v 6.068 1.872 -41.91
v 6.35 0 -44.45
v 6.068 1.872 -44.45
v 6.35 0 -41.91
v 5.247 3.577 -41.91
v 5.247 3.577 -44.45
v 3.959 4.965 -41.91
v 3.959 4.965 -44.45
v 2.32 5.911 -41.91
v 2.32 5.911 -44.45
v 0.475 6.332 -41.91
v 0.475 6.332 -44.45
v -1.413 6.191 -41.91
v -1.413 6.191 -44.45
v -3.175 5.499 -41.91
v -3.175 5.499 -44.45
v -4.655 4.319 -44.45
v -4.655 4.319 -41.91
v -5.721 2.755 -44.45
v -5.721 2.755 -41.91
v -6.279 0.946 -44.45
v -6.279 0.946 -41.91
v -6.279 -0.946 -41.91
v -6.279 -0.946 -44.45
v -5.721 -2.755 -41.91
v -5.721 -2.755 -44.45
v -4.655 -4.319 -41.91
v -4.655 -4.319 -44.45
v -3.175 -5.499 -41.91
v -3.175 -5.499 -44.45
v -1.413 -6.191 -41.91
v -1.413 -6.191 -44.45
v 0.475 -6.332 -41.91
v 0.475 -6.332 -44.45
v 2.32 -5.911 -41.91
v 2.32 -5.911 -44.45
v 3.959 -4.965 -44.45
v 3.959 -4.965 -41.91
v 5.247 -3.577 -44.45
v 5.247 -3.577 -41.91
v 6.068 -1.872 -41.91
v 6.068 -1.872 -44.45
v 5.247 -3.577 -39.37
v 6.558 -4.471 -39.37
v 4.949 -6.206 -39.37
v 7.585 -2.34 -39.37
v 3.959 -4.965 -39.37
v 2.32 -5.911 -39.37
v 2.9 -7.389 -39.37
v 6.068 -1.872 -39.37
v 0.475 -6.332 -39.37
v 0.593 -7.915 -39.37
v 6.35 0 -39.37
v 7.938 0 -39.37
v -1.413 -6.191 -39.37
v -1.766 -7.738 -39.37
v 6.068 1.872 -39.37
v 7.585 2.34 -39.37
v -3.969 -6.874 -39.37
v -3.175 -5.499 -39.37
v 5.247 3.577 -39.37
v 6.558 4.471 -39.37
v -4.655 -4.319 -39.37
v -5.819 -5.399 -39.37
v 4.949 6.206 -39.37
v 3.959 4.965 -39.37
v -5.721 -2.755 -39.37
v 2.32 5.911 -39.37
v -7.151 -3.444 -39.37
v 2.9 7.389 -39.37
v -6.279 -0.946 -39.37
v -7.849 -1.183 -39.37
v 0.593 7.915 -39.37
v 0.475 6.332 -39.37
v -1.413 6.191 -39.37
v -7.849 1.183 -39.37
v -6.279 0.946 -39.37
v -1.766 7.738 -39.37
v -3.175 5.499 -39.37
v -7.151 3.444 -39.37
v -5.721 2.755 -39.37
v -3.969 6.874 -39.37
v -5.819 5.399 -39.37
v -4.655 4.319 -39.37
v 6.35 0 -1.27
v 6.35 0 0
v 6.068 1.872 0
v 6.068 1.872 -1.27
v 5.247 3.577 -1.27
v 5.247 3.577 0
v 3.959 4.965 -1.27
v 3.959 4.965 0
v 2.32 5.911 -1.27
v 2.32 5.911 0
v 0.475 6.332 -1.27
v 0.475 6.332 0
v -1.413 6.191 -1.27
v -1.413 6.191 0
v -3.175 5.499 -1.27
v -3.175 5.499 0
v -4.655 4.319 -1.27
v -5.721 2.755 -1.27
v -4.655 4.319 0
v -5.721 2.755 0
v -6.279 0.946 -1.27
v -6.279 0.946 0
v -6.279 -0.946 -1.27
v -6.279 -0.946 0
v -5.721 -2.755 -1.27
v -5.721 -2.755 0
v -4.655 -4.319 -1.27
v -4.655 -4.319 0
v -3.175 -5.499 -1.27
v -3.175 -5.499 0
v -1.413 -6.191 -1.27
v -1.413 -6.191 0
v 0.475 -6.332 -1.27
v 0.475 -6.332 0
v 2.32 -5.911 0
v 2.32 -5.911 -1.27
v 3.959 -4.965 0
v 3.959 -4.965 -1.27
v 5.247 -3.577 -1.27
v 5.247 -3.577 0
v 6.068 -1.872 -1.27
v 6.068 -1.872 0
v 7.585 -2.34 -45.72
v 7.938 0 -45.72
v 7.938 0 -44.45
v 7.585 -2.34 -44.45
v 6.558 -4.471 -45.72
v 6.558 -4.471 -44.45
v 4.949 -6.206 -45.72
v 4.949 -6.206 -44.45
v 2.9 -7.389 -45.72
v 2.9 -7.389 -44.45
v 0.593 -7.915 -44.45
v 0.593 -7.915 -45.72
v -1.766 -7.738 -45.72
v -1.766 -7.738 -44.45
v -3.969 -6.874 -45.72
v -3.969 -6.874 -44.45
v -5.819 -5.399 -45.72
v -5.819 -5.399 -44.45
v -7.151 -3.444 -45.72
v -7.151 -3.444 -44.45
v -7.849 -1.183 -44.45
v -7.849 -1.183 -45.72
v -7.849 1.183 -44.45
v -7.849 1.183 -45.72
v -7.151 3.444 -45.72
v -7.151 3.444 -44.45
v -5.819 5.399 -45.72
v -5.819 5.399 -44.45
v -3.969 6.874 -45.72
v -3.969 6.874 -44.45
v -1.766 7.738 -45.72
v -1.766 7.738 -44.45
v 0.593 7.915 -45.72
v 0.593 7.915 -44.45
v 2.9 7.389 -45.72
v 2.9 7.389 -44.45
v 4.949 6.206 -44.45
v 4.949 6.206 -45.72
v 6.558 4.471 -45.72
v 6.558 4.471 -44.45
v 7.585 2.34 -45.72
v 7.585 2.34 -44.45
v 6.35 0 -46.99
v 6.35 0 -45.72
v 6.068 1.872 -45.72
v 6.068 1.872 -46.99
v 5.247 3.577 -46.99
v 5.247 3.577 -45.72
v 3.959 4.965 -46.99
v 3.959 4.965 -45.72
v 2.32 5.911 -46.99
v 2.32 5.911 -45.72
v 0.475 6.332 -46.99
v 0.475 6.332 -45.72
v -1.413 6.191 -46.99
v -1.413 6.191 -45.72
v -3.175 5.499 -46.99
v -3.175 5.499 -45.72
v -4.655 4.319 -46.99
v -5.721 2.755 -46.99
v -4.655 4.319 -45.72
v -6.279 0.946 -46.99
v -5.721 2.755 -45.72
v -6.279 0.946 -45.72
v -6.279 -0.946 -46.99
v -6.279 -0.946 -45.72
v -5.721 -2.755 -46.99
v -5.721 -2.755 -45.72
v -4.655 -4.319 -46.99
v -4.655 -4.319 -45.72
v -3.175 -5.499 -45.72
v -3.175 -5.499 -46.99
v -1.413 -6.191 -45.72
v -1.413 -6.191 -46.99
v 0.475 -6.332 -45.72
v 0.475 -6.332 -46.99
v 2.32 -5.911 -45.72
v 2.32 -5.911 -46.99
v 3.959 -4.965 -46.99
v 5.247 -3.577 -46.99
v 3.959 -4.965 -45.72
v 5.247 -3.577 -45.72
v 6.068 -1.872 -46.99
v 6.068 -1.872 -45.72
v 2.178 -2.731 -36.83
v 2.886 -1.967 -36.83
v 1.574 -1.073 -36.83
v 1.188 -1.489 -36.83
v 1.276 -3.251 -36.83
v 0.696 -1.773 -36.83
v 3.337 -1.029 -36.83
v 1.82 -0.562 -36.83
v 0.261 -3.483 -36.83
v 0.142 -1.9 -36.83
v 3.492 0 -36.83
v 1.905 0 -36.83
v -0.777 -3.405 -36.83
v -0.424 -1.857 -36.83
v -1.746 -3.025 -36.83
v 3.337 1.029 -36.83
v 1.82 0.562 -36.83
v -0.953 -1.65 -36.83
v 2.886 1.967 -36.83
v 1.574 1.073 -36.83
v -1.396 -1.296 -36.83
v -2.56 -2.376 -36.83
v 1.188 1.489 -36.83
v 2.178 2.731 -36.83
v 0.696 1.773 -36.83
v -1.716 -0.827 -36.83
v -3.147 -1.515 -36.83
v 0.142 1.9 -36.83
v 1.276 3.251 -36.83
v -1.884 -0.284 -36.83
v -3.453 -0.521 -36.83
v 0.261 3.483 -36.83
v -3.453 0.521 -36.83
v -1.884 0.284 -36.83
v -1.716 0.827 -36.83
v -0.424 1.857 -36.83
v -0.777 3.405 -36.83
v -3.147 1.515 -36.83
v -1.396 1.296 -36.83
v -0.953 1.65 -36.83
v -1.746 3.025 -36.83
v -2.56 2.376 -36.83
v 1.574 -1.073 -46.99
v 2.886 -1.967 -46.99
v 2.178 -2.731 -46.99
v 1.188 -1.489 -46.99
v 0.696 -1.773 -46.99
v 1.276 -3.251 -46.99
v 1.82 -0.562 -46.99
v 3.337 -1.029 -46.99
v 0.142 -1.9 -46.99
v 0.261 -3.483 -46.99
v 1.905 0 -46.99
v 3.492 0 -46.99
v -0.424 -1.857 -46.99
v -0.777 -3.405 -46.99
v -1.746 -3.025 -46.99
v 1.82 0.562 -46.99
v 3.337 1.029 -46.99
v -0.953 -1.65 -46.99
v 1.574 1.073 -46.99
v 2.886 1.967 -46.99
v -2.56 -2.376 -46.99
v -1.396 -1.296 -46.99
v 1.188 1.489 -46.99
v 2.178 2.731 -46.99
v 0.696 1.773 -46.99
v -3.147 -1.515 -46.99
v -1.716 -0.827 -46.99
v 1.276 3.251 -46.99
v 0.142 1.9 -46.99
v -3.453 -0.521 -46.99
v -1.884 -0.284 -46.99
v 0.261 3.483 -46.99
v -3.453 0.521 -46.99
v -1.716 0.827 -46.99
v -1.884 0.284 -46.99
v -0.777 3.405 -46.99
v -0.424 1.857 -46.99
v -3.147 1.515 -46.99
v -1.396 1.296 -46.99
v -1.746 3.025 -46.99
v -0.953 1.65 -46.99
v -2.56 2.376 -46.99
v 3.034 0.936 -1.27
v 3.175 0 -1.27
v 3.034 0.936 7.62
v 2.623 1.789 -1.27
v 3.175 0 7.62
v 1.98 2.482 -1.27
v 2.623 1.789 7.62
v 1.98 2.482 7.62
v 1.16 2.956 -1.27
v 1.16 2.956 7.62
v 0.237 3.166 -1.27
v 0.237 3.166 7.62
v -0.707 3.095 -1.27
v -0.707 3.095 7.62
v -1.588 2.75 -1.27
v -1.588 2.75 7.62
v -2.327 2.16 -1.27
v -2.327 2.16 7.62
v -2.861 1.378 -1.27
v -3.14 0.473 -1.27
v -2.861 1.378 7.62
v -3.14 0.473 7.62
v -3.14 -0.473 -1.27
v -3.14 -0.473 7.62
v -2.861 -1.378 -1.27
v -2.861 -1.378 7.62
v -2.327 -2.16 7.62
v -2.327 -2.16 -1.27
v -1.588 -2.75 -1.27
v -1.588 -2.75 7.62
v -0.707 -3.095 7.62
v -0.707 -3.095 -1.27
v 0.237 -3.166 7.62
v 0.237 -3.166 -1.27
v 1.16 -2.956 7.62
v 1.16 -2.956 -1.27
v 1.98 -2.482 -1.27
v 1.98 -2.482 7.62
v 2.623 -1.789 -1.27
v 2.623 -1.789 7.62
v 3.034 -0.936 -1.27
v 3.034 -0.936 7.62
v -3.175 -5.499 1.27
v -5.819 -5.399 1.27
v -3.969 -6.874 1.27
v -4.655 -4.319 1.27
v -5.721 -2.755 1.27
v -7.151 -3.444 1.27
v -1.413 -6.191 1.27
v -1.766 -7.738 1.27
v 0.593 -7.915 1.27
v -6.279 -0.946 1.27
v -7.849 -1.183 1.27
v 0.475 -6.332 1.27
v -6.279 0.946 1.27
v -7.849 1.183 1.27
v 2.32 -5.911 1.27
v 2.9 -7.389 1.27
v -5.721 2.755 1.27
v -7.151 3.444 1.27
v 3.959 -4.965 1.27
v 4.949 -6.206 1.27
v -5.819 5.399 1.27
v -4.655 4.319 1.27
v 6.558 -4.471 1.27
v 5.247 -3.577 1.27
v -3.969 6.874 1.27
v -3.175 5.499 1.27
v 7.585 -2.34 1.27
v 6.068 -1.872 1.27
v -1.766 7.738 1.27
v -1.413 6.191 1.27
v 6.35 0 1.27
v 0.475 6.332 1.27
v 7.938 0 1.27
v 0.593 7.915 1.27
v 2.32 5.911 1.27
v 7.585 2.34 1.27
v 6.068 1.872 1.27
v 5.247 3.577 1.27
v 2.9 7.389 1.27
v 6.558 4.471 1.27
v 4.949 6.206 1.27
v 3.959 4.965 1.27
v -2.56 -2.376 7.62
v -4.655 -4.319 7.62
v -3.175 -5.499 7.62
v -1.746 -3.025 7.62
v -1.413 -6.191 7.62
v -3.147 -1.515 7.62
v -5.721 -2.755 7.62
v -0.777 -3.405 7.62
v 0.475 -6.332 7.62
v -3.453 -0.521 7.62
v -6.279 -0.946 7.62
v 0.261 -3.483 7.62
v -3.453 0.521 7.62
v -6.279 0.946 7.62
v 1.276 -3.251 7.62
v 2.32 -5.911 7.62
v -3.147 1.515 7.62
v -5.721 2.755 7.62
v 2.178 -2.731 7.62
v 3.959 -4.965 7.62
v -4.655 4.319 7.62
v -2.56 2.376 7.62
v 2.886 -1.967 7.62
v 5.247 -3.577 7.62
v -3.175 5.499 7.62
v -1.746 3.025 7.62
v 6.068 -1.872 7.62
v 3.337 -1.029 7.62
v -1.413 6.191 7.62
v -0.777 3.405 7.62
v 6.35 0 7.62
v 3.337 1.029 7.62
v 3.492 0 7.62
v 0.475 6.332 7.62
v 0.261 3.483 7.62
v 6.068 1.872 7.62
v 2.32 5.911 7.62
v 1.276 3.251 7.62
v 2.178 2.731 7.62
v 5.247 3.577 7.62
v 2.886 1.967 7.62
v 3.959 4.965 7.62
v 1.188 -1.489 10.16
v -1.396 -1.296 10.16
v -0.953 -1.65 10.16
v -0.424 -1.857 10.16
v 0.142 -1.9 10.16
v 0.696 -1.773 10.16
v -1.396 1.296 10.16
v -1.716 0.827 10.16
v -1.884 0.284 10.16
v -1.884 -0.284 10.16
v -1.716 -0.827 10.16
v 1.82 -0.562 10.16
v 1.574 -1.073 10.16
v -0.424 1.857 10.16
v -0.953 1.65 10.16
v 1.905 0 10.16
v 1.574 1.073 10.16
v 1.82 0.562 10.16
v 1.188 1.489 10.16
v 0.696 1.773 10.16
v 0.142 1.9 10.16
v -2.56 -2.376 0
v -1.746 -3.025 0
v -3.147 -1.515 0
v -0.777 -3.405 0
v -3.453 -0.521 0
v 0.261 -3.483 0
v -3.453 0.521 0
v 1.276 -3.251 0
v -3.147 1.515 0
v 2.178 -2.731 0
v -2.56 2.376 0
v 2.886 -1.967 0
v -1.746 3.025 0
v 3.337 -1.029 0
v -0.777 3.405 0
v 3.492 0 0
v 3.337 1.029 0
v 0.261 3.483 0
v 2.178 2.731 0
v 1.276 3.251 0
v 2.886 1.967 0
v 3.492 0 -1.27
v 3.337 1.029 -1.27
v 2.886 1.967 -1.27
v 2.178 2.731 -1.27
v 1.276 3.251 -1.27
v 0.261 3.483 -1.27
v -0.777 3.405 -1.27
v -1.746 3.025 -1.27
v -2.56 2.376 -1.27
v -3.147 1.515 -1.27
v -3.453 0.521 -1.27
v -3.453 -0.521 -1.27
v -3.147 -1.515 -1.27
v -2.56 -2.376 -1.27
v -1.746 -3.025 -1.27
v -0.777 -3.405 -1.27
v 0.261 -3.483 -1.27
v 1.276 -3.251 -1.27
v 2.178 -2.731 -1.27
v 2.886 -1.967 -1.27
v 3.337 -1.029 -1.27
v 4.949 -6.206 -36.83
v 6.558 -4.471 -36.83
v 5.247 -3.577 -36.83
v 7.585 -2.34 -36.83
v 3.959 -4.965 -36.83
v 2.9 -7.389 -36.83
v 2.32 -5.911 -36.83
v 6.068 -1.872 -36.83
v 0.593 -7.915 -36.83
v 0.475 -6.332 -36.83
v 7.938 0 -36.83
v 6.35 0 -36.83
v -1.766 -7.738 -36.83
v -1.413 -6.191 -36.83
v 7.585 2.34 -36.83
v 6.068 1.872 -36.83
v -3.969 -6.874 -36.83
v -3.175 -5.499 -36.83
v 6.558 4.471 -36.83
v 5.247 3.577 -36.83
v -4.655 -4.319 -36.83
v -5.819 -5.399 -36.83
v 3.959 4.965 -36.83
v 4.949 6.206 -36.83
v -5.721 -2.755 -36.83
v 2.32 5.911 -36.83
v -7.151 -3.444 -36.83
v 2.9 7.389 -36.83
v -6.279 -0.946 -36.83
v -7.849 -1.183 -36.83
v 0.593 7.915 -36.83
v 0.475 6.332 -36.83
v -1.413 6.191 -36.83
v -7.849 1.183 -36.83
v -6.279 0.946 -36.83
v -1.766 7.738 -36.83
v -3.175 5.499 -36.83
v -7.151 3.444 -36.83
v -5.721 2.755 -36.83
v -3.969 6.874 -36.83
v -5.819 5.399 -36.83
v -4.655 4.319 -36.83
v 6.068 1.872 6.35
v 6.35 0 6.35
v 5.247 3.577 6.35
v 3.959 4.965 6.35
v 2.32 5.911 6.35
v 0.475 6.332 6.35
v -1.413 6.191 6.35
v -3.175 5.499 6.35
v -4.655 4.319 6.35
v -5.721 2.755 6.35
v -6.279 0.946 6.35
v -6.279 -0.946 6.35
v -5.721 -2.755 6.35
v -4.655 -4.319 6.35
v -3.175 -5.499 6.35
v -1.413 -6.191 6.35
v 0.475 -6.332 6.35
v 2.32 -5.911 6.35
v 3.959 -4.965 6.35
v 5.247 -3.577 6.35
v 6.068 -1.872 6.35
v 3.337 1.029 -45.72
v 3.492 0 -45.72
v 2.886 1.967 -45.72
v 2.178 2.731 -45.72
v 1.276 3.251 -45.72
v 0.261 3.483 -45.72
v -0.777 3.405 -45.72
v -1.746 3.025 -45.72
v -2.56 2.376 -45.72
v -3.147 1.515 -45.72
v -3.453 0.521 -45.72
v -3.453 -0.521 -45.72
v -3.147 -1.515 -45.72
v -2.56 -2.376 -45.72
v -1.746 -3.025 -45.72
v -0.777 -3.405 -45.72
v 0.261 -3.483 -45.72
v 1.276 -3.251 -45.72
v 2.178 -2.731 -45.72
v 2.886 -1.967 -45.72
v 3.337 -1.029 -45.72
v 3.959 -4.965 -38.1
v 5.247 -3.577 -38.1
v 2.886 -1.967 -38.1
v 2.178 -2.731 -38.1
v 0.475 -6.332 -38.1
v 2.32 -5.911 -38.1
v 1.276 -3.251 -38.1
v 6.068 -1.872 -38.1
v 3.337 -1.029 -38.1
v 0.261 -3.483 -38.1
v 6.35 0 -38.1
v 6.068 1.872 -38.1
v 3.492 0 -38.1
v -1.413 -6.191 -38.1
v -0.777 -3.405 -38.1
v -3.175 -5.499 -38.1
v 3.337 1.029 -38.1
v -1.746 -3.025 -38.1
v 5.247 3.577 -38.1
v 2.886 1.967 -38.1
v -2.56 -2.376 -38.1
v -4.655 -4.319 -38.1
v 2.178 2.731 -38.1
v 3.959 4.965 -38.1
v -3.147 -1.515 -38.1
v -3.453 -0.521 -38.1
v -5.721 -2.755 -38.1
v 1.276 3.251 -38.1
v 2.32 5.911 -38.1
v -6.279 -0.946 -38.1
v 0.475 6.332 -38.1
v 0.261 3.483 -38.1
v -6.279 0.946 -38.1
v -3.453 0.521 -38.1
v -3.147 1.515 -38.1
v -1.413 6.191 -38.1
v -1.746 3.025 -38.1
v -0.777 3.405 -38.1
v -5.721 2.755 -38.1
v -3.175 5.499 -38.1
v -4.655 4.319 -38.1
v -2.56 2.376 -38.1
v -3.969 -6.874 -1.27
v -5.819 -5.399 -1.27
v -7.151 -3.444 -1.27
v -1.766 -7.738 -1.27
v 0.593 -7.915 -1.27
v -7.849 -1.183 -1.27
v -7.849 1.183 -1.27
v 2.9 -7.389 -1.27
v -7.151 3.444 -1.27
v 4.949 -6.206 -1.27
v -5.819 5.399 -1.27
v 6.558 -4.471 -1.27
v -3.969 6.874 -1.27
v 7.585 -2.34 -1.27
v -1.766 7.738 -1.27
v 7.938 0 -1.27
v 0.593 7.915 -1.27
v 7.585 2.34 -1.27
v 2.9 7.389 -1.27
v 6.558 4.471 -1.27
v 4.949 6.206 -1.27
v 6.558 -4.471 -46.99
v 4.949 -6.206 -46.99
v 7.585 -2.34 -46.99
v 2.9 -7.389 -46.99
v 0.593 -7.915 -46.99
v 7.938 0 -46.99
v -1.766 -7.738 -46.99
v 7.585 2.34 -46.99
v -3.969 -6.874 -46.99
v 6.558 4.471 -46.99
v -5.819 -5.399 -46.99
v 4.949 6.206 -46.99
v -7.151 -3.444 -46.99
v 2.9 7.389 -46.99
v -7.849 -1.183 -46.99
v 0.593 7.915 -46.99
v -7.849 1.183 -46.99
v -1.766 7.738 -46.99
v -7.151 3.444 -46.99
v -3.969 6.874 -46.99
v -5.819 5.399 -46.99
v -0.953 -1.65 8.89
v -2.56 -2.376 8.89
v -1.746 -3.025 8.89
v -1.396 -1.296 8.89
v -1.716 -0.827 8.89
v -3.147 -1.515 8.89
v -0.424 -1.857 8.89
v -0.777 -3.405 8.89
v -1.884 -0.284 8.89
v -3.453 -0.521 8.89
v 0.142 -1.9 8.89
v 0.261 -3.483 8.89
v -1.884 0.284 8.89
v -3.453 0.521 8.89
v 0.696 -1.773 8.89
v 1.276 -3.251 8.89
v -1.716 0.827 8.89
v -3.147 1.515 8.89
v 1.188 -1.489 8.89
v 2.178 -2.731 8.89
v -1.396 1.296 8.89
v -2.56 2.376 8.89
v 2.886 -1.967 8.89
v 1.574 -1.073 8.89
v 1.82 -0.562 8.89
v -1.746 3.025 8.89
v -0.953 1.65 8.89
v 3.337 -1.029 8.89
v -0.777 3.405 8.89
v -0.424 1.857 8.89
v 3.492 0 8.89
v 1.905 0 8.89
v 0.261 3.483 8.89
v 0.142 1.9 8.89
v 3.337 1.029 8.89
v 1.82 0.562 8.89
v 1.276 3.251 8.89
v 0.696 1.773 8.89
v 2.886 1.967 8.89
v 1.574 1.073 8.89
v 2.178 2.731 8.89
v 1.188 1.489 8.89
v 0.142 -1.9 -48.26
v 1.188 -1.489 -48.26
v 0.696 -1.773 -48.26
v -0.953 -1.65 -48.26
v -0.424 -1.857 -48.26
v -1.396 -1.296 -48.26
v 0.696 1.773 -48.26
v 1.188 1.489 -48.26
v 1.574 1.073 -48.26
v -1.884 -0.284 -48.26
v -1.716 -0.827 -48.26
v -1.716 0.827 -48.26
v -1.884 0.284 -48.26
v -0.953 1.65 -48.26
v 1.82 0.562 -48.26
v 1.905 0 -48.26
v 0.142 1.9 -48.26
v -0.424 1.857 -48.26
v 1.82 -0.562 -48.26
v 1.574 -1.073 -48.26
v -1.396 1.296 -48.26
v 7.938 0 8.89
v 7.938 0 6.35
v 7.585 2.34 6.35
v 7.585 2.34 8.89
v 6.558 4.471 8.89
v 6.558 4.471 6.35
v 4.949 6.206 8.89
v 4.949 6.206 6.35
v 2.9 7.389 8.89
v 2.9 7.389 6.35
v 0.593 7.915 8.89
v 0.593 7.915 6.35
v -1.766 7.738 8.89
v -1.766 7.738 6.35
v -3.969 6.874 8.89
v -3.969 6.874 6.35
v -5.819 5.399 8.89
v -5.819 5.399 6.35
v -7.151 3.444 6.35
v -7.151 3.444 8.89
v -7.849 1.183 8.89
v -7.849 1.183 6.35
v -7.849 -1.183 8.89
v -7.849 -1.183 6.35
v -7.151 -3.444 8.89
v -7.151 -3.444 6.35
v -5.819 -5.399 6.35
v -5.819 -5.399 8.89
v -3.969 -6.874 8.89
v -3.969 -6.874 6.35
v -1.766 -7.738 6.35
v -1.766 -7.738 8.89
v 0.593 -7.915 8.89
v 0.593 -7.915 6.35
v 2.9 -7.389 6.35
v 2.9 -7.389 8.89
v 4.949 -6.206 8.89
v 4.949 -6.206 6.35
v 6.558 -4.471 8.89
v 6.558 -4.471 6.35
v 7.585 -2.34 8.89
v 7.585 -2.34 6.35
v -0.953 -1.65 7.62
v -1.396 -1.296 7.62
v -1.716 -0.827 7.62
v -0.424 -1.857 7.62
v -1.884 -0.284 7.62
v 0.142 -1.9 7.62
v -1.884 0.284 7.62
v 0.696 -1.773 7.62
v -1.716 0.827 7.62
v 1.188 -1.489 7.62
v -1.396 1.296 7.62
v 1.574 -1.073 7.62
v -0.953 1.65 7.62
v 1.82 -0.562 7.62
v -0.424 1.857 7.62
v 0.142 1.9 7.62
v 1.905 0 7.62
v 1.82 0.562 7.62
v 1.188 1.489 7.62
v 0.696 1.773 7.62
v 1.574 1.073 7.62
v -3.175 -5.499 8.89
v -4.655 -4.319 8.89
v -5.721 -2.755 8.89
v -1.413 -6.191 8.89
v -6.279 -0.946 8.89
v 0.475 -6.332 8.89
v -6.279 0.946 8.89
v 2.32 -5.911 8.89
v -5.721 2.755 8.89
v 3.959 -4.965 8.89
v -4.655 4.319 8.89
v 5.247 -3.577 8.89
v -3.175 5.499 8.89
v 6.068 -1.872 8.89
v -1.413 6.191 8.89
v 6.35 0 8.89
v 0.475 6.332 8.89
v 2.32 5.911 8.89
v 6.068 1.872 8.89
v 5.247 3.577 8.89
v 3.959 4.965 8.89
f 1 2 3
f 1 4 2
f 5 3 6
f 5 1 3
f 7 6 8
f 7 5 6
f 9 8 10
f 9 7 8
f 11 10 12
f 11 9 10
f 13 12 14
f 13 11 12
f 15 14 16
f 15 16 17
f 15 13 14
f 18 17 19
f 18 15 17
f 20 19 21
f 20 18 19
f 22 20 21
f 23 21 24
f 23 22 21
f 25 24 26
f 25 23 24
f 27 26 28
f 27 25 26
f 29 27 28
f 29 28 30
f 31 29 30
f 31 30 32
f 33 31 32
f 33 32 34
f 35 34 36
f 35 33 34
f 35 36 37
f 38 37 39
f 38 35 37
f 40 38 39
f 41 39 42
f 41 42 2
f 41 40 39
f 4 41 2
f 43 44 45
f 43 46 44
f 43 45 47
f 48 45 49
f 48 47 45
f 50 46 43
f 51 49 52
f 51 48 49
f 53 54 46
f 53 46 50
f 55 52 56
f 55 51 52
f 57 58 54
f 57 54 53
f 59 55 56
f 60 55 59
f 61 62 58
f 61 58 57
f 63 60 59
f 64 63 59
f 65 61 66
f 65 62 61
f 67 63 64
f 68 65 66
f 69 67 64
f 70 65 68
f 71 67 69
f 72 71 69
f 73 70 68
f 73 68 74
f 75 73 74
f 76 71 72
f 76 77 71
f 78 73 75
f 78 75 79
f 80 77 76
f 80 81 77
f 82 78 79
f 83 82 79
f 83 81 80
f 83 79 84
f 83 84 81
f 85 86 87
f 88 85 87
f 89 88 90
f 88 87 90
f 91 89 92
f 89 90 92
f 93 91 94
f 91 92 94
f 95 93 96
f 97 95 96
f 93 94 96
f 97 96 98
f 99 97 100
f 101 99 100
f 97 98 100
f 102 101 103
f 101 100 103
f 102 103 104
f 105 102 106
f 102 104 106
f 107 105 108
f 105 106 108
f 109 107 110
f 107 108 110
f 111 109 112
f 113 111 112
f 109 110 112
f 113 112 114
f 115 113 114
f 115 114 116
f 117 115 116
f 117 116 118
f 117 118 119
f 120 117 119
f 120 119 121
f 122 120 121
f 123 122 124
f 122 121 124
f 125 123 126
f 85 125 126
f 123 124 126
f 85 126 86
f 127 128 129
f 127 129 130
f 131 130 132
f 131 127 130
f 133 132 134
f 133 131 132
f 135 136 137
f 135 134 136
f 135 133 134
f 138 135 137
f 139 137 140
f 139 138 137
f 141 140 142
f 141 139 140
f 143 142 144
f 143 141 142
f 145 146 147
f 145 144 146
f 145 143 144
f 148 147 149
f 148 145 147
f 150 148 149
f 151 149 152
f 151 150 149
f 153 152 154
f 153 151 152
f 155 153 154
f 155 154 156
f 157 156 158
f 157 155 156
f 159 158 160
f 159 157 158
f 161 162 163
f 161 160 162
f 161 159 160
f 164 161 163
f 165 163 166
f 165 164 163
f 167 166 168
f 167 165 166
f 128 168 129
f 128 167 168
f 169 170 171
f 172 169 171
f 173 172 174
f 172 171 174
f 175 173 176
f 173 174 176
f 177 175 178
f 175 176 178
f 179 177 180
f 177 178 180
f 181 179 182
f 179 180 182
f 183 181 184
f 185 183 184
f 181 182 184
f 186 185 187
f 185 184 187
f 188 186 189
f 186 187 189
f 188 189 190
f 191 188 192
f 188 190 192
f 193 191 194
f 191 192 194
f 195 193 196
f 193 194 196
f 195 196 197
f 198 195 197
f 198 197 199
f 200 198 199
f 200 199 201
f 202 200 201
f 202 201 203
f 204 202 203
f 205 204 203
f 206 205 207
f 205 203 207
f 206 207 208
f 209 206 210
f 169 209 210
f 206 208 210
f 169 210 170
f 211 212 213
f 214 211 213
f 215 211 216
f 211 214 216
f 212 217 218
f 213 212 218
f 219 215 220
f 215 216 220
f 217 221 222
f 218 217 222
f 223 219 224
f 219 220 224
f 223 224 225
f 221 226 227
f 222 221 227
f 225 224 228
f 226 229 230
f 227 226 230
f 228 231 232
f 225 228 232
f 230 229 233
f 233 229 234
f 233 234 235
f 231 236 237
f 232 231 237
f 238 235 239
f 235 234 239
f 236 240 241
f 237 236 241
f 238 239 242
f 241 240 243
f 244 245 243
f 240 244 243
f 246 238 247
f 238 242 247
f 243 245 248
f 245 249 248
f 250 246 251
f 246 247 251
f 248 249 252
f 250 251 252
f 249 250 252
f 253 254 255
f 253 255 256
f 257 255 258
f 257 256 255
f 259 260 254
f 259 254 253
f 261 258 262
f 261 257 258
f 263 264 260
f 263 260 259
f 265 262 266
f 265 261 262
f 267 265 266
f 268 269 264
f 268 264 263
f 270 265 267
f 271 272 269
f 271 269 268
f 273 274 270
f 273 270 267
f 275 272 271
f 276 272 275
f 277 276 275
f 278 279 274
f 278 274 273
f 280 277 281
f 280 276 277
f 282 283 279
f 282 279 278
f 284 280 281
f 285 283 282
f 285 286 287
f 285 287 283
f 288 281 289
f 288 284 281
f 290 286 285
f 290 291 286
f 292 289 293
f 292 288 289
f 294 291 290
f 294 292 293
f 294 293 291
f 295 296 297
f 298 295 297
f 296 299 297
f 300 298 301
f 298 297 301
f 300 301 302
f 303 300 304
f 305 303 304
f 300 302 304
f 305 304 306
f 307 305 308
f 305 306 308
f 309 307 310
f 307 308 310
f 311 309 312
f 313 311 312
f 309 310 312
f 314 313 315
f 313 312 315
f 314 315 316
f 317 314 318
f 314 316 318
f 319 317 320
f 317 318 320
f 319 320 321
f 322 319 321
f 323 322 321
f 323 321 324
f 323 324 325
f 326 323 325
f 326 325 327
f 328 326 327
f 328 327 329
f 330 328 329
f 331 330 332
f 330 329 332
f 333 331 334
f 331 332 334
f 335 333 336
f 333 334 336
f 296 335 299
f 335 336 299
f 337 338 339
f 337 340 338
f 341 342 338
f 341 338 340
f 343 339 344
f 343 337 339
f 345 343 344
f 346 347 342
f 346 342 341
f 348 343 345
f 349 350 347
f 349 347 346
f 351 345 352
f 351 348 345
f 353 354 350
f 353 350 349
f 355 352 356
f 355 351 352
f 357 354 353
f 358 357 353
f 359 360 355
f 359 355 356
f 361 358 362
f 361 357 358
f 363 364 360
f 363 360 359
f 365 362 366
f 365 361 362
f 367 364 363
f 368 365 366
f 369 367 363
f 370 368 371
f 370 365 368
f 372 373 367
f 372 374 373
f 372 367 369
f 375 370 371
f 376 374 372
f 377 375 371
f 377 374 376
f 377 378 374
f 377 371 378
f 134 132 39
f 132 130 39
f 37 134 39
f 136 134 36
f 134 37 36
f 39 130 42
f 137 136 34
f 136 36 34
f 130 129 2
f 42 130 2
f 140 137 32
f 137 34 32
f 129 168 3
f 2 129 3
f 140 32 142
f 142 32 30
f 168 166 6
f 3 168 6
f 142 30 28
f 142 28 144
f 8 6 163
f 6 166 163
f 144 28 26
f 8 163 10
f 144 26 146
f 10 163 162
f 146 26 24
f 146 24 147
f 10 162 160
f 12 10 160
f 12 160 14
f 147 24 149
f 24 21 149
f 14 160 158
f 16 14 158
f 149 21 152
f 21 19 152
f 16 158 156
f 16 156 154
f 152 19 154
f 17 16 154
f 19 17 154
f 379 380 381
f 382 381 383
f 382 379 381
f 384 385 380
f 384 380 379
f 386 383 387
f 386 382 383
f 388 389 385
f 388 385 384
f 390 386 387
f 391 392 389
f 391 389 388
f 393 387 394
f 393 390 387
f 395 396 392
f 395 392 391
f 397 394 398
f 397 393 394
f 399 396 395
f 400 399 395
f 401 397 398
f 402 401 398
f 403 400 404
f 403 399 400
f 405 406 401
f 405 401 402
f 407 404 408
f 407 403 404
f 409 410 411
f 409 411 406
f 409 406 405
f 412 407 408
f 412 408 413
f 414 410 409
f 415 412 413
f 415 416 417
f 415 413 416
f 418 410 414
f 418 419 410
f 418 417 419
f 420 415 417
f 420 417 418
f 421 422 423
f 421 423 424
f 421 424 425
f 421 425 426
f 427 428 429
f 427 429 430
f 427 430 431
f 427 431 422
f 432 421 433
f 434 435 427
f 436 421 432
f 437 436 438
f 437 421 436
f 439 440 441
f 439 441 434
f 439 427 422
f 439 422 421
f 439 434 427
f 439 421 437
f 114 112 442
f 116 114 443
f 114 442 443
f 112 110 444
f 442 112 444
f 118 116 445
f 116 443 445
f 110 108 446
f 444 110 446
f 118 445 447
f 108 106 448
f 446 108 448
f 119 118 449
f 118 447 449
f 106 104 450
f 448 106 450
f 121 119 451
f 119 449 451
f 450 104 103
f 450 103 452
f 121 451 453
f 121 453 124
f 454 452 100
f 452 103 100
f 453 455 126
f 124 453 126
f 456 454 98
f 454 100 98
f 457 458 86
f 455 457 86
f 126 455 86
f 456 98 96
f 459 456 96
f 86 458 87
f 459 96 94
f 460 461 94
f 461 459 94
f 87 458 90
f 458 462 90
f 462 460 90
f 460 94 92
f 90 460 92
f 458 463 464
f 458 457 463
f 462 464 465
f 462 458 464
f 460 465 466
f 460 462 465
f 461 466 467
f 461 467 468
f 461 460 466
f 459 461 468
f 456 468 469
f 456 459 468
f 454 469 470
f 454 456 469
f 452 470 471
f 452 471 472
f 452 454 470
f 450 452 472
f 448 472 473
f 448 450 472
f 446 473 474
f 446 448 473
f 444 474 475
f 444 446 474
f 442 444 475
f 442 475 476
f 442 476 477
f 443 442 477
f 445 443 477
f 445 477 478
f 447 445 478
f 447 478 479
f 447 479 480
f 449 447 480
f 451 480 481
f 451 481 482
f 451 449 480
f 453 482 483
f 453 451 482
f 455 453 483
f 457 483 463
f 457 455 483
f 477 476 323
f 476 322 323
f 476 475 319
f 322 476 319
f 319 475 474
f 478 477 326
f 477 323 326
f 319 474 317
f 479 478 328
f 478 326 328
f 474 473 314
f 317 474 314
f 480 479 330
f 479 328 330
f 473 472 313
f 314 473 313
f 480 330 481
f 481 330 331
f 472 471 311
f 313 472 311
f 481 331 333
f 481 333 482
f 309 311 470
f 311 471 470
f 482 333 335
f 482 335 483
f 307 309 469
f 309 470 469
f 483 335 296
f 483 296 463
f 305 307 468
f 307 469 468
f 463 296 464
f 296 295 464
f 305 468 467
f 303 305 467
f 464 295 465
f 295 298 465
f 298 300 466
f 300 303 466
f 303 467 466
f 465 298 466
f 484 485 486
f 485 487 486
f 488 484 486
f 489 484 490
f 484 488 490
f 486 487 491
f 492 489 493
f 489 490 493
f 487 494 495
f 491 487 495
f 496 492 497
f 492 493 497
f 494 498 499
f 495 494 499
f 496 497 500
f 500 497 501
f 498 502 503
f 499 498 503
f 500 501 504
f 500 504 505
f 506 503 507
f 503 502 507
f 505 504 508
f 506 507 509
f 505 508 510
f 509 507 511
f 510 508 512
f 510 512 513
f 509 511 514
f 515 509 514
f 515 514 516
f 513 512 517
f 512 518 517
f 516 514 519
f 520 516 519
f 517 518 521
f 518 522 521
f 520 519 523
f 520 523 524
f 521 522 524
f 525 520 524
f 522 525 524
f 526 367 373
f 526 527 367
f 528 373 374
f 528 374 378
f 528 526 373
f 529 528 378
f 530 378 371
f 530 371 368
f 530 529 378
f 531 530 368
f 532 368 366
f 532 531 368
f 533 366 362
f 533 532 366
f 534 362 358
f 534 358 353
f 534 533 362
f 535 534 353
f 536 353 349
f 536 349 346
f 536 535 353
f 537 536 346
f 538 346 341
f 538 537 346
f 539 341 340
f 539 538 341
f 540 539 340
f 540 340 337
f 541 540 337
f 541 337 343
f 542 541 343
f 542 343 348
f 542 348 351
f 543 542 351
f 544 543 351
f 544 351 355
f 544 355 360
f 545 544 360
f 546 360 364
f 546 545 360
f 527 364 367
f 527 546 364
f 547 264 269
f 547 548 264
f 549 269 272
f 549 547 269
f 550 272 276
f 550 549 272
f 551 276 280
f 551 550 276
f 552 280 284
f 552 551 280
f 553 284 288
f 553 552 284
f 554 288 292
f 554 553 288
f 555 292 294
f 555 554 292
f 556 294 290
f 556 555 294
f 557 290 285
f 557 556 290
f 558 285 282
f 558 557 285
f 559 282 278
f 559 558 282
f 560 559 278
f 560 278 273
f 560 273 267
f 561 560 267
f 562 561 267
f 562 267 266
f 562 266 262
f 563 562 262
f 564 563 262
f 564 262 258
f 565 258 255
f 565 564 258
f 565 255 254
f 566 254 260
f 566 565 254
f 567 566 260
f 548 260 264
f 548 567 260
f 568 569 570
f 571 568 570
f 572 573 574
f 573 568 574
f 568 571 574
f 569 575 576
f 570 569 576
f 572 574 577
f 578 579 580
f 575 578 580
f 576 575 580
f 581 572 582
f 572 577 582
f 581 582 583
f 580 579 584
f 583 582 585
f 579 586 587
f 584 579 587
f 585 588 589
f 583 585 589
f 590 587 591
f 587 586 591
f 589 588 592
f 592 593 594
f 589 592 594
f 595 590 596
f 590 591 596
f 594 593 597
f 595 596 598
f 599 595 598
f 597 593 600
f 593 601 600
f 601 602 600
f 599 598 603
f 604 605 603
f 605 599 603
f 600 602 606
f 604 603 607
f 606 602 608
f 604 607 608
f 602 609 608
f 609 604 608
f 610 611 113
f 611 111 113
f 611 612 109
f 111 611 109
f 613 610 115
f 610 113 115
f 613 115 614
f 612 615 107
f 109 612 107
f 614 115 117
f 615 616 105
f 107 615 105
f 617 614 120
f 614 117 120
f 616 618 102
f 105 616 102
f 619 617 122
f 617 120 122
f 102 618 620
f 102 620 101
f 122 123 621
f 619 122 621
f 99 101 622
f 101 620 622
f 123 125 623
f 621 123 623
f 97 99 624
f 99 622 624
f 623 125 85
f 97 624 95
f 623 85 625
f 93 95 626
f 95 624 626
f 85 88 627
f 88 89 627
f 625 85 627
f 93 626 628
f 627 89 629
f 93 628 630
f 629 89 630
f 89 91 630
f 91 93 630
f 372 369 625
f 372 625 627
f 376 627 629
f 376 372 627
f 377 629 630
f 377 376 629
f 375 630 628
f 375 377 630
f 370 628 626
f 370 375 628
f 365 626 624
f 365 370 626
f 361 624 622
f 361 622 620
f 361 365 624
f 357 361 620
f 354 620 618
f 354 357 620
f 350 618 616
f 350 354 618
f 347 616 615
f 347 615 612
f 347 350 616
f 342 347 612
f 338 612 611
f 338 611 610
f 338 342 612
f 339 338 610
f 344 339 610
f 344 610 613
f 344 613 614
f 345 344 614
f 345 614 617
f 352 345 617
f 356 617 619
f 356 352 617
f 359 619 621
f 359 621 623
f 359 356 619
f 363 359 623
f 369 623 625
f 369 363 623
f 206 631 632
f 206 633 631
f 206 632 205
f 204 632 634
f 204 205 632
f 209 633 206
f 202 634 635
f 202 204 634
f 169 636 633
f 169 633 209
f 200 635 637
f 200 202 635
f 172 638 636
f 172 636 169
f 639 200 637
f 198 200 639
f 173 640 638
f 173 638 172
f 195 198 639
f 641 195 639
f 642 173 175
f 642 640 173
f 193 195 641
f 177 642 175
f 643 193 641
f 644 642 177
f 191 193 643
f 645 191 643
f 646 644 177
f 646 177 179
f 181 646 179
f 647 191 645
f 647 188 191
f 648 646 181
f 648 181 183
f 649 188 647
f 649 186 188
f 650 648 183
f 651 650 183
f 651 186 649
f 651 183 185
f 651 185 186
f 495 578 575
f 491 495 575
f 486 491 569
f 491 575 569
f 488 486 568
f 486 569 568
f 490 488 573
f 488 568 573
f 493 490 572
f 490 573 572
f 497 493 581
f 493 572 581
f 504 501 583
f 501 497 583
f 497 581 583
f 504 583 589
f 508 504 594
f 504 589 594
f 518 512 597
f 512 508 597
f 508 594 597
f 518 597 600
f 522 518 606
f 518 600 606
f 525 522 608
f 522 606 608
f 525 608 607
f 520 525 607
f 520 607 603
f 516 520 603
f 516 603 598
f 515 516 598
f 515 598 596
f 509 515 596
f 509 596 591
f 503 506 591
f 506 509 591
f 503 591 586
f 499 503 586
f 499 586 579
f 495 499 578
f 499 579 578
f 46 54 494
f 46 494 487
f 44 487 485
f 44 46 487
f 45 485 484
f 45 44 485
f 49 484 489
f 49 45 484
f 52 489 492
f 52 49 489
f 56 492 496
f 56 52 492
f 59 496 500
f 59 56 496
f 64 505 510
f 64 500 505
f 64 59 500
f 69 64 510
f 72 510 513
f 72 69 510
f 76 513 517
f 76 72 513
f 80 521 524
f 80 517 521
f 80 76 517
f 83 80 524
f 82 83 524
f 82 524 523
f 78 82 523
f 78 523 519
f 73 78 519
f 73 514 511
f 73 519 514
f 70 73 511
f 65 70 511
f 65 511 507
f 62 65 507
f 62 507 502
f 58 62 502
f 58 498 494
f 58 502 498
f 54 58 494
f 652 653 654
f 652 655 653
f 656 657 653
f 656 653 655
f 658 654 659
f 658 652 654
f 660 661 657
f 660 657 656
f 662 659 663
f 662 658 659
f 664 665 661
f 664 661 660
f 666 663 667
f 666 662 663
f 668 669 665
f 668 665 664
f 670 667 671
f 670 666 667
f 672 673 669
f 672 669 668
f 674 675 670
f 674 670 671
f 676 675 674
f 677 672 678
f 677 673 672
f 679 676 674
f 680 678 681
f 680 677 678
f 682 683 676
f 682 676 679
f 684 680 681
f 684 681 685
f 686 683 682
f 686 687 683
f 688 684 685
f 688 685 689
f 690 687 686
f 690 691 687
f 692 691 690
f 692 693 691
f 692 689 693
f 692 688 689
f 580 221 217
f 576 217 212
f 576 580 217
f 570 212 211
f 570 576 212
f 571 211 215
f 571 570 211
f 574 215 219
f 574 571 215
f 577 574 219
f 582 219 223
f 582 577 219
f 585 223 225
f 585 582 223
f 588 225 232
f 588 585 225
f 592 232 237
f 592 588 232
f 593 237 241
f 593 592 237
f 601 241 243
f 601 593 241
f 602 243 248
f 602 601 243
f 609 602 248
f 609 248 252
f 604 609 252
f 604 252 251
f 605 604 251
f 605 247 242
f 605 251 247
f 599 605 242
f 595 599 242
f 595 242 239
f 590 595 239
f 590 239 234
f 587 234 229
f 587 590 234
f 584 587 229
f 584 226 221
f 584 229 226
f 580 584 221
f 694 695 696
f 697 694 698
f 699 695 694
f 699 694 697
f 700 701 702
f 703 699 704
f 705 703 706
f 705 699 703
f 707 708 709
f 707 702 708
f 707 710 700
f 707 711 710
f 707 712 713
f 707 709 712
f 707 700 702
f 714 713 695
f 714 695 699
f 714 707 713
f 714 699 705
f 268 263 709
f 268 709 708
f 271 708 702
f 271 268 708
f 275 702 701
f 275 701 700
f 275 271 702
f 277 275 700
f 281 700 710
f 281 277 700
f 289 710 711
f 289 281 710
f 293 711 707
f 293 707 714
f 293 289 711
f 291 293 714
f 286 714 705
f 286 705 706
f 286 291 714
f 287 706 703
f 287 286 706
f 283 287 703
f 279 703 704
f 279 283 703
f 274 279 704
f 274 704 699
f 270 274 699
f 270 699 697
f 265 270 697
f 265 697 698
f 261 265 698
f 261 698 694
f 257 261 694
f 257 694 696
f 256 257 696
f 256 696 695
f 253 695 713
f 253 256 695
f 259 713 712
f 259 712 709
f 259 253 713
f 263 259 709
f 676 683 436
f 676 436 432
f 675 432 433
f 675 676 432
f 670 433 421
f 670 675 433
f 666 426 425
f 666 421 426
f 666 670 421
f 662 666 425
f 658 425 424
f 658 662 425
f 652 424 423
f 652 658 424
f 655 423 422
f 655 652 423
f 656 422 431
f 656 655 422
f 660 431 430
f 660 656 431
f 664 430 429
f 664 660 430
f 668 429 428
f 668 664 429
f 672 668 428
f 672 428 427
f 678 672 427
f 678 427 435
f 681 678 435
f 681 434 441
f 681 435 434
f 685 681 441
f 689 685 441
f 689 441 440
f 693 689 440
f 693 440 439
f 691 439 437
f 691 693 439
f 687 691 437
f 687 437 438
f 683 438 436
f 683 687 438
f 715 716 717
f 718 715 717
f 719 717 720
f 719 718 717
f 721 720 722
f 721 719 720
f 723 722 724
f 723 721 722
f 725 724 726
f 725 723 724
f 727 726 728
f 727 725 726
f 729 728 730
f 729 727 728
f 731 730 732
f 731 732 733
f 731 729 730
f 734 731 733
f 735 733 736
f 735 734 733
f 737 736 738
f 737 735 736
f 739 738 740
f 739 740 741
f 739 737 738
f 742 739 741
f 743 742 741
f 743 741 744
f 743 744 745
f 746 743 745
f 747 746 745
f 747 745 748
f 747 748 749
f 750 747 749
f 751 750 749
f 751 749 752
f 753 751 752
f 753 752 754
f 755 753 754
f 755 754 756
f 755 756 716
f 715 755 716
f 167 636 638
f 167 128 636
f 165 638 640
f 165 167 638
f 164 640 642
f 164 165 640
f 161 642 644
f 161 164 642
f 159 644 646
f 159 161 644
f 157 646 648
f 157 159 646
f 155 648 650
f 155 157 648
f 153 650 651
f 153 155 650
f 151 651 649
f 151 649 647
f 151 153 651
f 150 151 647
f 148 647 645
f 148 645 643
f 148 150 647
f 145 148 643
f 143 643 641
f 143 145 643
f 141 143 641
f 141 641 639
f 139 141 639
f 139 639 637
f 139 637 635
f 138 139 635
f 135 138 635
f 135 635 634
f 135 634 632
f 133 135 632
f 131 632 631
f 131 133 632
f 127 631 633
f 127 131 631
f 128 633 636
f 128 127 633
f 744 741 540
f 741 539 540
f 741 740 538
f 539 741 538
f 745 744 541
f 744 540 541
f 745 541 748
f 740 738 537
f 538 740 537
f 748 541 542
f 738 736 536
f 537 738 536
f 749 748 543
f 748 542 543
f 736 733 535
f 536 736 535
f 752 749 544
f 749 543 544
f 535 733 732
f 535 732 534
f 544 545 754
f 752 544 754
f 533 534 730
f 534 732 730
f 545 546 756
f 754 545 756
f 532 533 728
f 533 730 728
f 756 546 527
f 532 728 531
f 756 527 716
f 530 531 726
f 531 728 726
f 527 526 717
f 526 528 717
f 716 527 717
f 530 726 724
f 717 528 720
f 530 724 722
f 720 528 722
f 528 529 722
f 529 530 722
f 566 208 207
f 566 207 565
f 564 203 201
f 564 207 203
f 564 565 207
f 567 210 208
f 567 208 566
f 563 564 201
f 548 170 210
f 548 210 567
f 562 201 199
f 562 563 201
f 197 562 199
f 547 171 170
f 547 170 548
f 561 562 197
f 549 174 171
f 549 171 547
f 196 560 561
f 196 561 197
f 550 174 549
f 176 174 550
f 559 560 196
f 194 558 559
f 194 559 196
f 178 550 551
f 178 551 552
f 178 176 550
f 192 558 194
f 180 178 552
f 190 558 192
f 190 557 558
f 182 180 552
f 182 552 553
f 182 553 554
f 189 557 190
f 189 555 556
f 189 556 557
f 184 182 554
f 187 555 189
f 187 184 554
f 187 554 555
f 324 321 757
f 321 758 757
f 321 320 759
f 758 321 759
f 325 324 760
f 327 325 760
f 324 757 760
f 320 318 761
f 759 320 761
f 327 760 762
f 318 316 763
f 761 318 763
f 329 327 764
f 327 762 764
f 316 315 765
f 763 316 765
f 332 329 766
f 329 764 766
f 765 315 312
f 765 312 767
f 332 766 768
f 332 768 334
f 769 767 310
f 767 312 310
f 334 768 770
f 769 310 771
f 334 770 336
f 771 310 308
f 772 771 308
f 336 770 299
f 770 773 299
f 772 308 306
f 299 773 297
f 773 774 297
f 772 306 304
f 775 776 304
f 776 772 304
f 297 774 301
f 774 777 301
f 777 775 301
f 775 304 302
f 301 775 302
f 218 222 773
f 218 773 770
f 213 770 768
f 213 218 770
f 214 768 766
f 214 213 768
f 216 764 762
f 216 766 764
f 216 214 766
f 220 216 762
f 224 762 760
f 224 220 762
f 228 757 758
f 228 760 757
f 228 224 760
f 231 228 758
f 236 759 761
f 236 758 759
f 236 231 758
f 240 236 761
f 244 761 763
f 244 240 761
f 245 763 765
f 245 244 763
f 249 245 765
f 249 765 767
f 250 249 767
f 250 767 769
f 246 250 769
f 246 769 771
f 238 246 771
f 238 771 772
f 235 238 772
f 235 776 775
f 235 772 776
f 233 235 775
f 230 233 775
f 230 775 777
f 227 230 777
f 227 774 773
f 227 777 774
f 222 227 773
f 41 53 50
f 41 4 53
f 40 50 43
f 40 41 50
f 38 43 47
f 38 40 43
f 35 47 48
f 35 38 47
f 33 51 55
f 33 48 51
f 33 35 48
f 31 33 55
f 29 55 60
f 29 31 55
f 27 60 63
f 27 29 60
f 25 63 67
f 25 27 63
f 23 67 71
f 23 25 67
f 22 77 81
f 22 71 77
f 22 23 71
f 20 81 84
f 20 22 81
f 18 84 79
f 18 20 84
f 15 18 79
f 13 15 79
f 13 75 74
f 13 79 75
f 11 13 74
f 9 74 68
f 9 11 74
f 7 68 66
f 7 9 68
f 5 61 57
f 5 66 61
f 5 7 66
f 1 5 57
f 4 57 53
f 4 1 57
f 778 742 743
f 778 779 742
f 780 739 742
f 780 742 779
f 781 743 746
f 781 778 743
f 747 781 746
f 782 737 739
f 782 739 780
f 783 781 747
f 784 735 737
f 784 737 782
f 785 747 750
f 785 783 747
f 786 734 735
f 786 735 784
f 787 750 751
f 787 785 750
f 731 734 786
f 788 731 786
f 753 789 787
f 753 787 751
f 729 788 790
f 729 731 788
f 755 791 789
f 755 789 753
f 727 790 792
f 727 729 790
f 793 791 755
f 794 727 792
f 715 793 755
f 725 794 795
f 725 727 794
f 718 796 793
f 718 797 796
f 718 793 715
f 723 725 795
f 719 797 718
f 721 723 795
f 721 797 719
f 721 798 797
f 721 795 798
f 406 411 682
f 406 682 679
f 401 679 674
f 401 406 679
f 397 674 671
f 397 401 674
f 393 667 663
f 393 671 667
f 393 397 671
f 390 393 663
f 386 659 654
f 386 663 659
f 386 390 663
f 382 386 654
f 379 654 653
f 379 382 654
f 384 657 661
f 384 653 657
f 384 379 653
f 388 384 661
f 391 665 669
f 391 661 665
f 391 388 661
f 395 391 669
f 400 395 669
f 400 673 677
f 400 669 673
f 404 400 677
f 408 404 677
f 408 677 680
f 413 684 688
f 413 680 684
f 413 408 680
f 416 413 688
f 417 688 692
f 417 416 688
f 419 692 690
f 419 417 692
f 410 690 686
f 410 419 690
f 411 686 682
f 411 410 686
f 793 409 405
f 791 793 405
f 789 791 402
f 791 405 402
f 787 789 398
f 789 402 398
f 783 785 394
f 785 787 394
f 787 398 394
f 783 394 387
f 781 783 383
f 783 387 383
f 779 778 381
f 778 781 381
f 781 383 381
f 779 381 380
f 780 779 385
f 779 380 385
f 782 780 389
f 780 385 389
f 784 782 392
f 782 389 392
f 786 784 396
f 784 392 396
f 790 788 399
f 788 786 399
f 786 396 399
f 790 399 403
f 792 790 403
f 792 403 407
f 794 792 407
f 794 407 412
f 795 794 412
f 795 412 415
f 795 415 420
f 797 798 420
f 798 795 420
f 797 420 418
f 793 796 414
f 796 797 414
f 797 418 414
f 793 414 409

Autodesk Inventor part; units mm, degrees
ref_plane "YZ Plane" through (0, 0, 0) normal (1, 0, 0) x (0, 1, 0)
sketch "Sketch3" plane through (0, 0, 0) normal (0, 0, 1) x (1, 0, 0)
  circle A0 centre (0, 0) radius 6.35
  dimension "d11" = 12.7
extrude "Extrusion3" add sketch "Sketch3" along normal blind 7.62
sketch "Sketch4" plane through (0, 0, 7.62) normal (0, 0, 1) x (1, 0, 0)
  circle A0 centre (0, 0) radius 7.9375
  circle A1 centre (0, 0) radius 6.35
  dimension "d14" = 15.875
  dimension "d15" = 12.7
extrude "Extrusion4" add sketch "Sketch4" along normal blind 1.27 and the other way blind 8.89
ref_plane "Work Plane1" through (0, 0, 3.81) normal (0, 0, 1) x (1, 0, 0)
sketch "Sketch5" plane through (0, 0, 3.81) normal (0, 0, 1) x (1, 0, 0)
  circle A0 centre (0, 0) radius 6.35 projected
  circle A1 centre (0, 0) radius 8.89
  circle A2 centre (0, 0) radius 7.9375 projected
  circle A3 centre (0, 0) radius 8.9298
extrude "Extrusion5" cut sketch "Sketch5" along normal mid plane 5.08 contours A2
sketch "Sketch6" plane through (0, 0, 7.62) normal (0, 0, 1) x (1, 0, 0)
  circle A0 centre (0, 0) radius 1.905
  circle A1 centre (0, 0) radius 3.4925
  dimension "d23" = 3.81
  dimension "d24" = 6.985
extrude "Extrusion6" add sketch "Sketch6" along normal blind 1.27 and the other way blind 8.89
sketch "Sketch7" plane through (0, 0, 7.62) normal (0, 0, 1) x (1, 0, 0)
  circle A0 centre (0, 0) radius 3.175
extrude "Extrusion7" cut sketch "Sketch7" against normal blind 9.2075
sketch "Sketch8" plane through (0, 0, 3.81) normal (0, 0, 1) x (1, 0, 0)
  circle A0 centre (0, 0) radius 1.905
  dimension "d36" = 3.81
extrude "Extrusion8" add sketch "Sketch8" along normal blind 6.35 and the other way blind 22.86
ref_plane "Work Plane2" through (0, 0, -19.05) normal (0, 0, -1) x (-1, 0, 0)
mirror "Mirror1" about plane through (0, 0, -19.05) normal (0, 0, -1) of "Extrusion5", "Extrusion4", "Extrusion3", "Extrusion8", "Extrusion6"
properties part number "Small Wheels for Polar Express [Copy]"
